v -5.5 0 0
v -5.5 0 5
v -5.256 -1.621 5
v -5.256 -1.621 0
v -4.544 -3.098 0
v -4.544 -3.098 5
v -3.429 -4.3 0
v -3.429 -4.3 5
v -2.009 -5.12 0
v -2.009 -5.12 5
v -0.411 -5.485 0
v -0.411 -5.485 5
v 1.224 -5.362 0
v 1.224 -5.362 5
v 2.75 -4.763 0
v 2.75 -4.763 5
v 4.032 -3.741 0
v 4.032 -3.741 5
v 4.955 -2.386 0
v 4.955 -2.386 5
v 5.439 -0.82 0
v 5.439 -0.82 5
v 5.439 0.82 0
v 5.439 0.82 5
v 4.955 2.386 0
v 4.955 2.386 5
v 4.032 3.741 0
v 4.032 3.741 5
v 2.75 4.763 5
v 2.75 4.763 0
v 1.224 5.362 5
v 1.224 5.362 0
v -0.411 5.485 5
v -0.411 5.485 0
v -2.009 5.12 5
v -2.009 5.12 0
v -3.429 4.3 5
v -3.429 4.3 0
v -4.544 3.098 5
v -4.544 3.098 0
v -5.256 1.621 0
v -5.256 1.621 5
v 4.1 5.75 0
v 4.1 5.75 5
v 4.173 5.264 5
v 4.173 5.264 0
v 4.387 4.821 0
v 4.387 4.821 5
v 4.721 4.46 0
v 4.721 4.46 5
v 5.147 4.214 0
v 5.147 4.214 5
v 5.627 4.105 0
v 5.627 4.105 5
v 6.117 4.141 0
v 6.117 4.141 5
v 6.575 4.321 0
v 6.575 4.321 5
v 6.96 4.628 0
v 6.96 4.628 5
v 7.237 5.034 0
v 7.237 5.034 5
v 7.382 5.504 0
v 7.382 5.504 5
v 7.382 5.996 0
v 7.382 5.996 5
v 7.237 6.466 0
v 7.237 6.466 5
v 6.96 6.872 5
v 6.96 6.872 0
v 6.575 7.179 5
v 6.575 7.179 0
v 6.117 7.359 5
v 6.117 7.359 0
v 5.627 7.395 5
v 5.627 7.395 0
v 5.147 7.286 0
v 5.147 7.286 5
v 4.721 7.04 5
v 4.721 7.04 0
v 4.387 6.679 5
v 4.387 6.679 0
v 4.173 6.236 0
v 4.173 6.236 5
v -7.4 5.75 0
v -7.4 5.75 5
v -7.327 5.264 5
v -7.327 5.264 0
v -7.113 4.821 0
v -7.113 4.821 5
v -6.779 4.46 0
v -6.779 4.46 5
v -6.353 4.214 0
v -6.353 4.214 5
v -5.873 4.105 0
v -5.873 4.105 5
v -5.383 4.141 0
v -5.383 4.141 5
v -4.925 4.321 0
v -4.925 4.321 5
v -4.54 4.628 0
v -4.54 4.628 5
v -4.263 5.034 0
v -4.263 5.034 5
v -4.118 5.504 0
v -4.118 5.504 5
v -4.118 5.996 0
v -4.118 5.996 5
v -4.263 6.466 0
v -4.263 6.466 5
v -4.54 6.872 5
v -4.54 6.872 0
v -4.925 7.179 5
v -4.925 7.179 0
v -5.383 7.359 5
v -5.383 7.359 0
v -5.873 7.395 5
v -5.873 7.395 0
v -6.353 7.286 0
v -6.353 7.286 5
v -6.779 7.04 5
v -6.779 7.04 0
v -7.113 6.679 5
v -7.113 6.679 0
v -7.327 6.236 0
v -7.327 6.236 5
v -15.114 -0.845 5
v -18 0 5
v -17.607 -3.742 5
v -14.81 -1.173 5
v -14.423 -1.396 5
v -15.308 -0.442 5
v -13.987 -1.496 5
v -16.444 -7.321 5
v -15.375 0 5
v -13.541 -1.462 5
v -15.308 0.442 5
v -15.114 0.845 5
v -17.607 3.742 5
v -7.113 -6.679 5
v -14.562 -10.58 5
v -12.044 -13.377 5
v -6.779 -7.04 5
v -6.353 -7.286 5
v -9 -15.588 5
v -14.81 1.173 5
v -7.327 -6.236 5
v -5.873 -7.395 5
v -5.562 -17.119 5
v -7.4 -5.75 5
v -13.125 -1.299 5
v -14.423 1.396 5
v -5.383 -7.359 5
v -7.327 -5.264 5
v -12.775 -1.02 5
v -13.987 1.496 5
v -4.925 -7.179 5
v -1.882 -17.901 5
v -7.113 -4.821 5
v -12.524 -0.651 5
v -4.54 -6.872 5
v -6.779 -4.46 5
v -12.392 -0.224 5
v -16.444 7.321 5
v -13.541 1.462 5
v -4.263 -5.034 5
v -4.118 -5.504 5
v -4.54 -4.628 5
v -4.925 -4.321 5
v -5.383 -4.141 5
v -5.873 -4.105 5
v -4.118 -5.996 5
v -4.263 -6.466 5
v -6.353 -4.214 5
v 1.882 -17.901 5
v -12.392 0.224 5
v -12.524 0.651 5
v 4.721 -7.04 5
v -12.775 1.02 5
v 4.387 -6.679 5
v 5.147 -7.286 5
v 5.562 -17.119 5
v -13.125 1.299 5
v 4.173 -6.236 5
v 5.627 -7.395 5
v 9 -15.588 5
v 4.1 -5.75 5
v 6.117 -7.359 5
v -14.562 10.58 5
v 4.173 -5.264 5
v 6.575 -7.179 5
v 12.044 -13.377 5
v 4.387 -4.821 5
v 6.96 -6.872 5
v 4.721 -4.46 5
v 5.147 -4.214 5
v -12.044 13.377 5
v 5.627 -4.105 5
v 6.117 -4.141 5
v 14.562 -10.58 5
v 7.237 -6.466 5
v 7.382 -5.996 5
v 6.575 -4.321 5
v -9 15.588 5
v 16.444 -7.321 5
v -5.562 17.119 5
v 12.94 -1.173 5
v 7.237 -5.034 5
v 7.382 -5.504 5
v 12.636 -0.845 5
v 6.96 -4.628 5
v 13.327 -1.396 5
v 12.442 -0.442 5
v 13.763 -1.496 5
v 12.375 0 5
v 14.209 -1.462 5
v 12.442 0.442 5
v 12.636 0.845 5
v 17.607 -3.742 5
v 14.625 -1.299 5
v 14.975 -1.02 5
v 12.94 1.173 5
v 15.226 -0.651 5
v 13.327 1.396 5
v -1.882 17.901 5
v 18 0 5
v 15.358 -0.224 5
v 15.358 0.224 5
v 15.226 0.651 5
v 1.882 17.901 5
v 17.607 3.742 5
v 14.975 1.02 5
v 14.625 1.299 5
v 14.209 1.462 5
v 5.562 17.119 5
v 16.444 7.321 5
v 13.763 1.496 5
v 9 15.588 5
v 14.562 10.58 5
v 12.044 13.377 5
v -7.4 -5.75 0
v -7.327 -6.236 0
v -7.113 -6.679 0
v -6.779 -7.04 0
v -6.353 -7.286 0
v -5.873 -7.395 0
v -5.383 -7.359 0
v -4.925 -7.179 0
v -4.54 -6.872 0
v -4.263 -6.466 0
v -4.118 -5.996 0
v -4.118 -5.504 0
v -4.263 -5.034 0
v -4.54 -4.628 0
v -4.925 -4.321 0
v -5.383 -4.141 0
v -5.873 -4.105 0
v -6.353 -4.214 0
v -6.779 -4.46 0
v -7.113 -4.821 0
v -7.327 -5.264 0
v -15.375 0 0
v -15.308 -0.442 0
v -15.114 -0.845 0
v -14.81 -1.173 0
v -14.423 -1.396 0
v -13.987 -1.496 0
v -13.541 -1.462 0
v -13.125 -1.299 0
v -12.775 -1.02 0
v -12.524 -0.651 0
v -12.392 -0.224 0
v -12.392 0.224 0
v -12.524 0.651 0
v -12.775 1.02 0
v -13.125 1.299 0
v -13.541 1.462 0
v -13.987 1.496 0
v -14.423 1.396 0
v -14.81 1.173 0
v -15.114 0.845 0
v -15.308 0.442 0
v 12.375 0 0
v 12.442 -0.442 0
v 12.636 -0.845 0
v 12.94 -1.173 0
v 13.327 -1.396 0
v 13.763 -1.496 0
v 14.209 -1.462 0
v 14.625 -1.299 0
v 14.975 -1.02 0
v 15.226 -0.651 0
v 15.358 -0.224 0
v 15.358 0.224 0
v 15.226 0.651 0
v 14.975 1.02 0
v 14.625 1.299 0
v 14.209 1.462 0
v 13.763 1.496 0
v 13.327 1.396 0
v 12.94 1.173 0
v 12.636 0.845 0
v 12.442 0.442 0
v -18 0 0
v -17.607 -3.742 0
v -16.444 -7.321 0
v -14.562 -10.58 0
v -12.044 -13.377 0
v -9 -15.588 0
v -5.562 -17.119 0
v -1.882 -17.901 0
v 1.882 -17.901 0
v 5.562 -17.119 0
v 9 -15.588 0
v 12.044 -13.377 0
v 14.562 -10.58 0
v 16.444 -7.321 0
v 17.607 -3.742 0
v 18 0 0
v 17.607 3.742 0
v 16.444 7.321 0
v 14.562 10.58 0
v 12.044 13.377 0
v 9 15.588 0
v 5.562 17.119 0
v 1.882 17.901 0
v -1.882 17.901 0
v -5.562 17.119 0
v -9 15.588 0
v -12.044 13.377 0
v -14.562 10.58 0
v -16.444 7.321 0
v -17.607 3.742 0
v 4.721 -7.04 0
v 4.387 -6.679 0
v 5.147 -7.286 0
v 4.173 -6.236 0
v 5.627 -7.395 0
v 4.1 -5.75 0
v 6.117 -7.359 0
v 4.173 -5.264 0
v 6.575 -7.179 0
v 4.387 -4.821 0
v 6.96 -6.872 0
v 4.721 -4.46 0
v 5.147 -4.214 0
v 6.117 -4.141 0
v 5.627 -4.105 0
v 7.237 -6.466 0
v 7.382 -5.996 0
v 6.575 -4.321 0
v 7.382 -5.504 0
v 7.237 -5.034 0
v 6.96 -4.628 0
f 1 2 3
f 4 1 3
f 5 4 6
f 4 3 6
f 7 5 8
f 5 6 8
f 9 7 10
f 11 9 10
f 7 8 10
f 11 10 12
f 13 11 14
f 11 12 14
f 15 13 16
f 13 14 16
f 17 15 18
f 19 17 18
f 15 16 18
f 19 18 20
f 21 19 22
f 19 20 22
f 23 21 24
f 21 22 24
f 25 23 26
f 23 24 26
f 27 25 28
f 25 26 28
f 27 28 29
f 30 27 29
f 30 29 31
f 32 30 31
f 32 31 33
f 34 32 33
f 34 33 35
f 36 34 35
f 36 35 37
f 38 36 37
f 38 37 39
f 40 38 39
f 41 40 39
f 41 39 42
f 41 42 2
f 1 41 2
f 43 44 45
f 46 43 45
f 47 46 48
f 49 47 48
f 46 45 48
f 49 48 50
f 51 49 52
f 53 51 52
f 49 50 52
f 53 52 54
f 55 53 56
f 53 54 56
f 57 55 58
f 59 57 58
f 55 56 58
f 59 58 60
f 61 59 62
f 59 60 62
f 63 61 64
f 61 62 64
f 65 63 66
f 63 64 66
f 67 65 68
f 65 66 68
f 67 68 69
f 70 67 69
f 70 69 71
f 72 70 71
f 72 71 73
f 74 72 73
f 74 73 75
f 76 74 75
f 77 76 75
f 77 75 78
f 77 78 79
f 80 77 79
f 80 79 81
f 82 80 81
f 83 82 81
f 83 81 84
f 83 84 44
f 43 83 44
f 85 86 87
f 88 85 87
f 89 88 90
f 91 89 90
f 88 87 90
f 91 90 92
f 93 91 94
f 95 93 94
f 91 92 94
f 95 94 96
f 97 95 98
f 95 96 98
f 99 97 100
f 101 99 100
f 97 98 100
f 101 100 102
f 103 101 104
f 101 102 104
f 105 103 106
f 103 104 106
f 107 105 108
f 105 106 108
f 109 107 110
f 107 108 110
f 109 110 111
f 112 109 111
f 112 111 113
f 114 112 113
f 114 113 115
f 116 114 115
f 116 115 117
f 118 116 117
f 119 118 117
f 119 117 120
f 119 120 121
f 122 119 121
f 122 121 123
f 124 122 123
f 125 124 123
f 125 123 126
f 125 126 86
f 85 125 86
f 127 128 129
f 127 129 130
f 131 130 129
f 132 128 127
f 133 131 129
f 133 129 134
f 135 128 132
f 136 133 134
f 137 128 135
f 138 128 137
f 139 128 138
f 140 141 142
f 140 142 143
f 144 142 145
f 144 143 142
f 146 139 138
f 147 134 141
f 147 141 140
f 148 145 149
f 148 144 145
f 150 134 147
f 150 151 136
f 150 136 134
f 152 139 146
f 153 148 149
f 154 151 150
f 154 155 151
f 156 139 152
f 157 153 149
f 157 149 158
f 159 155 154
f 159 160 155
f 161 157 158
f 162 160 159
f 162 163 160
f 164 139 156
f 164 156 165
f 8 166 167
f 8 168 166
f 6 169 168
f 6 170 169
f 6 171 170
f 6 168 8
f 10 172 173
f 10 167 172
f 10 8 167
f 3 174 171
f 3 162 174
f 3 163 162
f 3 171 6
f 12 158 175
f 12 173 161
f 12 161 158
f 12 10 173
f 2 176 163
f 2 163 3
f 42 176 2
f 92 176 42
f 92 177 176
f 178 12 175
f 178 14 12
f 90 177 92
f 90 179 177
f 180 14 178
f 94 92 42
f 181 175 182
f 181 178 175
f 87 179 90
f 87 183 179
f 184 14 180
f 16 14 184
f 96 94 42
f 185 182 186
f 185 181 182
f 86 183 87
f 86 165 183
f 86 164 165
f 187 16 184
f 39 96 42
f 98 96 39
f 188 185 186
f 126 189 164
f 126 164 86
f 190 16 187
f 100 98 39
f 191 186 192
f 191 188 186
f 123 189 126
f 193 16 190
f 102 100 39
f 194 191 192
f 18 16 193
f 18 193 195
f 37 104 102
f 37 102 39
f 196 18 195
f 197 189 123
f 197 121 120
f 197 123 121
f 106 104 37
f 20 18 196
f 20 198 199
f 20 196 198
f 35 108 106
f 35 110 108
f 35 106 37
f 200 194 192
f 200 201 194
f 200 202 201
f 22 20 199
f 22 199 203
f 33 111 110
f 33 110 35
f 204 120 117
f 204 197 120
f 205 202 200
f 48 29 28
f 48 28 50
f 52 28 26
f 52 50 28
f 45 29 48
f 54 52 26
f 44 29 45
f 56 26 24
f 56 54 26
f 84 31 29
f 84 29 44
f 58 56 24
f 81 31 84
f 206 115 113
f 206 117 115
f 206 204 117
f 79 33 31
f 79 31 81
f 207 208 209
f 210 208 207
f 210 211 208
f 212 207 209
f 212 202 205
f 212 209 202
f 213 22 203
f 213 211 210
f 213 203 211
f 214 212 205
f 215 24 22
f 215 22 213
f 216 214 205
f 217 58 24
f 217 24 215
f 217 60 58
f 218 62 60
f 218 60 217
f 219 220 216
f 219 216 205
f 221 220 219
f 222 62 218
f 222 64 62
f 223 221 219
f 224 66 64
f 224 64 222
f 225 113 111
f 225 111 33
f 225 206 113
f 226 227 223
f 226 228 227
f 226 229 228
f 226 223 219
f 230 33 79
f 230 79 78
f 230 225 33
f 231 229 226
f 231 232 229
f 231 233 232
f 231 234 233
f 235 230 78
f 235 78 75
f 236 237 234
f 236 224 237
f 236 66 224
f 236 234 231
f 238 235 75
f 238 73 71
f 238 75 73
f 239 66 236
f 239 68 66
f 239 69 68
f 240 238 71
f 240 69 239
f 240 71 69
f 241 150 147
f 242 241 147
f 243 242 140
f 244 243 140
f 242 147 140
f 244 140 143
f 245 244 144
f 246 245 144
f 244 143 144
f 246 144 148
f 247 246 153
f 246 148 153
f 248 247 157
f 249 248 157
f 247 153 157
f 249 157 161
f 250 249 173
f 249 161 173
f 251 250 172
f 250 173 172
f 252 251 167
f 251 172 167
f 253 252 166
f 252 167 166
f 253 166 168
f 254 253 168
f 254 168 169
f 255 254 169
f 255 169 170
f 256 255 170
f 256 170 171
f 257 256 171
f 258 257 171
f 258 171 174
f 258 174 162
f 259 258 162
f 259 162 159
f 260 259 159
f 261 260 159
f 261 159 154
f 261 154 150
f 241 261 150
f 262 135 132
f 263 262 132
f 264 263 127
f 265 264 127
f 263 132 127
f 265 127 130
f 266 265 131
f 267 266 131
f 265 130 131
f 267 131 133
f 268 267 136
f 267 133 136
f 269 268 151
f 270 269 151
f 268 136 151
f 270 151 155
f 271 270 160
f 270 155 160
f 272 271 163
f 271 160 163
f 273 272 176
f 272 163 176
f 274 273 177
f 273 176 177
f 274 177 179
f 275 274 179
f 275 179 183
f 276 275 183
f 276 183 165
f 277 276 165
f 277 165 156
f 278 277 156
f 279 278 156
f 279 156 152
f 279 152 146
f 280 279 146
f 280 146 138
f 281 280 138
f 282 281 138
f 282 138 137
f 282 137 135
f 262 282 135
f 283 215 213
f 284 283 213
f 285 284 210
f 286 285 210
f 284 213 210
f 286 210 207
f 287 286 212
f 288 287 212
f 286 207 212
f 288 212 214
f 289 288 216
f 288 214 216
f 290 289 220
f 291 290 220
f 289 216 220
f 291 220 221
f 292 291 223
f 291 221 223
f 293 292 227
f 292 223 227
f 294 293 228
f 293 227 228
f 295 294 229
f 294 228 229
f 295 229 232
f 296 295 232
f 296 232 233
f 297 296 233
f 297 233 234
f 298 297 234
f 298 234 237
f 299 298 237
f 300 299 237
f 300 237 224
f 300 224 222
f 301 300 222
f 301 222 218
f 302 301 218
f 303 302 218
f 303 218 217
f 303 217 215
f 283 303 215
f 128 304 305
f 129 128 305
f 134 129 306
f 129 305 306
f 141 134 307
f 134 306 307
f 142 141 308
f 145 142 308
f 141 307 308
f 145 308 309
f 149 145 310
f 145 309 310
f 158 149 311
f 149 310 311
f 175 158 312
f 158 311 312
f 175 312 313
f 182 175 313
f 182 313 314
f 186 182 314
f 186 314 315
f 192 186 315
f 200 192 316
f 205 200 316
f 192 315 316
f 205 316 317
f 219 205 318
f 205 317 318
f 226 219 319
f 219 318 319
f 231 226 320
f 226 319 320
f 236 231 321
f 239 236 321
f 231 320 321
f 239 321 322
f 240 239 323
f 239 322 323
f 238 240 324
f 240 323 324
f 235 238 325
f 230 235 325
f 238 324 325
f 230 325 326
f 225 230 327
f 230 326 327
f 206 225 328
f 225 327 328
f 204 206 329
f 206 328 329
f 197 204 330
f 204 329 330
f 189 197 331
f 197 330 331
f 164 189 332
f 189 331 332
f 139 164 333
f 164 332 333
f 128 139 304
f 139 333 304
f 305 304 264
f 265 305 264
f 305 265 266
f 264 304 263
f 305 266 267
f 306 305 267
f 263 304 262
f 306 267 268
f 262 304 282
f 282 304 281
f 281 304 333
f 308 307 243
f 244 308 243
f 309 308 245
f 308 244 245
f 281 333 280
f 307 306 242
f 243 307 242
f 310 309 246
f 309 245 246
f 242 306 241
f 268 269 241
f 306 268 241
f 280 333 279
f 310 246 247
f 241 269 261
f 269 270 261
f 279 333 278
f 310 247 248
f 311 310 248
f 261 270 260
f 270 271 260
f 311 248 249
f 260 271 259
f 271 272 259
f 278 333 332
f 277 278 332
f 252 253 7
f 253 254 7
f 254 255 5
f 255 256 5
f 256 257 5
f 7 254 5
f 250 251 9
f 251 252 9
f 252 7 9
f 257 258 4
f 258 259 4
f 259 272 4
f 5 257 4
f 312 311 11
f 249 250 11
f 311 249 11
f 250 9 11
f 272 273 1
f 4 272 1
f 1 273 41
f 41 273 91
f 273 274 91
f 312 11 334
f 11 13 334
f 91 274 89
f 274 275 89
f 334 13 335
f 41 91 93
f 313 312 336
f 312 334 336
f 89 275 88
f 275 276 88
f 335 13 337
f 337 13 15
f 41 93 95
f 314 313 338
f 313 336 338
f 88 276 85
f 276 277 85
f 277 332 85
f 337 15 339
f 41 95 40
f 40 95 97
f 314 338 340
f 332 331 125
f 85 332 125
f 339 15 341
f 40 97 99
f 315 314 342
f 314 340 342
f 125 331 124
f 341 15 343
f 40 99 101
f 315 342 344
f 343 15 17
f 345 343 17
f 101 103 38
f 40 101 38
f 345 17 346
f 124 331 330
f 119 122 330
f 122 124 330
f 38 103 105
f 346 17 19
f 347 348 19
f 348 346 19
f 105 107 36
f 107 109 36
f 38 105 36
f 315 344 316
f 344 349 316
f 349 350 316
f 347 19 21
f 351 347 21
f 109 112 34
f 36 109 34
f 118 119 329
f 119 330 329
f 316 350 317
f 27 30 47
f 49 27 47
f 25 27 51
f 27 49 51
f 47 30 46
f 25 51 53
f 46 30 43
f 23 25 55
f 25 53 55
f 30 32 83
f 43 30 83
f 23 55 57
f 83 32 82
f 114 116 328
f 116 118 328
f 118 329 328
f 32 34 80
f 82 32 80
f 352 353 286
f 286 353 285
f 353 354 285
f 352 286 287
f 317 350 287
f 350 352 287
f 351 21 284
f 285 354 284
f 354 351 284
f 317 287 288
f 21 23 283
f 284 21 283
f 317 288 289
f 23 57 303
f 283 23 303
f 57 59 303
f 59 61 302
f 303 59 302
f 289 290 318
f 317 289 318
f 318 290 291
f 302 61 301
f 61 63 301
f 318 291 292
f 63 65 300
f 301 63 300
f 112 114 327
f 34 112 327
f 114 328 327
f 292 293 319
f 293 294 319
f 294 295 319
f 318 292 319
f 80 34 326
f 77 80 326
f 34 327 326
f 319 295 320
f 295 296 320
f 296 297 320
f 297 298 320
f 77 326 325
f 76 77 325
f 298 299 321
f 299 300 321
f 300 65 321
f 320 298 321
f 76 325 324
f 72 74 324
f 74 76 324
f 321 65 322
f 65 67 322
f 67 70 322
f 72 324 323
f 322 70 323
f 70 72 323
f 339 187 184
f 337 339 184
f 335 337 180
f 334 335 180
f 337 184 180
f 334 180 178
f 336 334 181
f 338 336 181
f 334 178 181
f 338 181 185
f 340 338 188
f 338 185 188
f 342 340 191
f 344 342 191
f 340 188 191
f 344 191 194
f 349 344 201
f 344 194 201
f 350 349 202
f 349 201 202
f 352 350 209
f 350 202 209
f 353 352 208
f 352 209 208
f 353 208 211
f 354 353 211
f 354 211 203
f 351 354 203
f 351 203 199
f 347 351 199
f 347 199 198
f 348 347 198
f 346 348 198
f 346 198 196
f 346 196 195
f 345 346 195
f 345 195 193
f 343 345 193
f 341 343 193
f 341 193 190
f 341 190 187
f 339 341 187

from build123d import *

# Parameters (mm, degrees)
F1_DEPTH = 5
F2_D     = 3
F2_DEPTH = 6
F2_TIP   = 0.9012909285
F3_D     = 3.3
F3_DEPTH = 6
F3_TIP   = 0.9914200214
F4_D     = 11
F4_DEPTH = 11
F4_TIP   = 3.3047334047


with BuildPart() as f1:
    # F0 (on Top) → F1 (new body)
    with BuildSketch(Plane.XY):
        with BuildLine():
            Line((9.75, 0), (18, 0))
            ThreePointArc((18, 0), (0, 18), (-18, 0))
            Line((-18, 0), (-9.75, 0))
            ThreePointArc((-9.75, 0), (0, 9.75), (9.75, 0))
        make_face()
        with BuildLine():
            ThreePointArc((-18, 0), (0, -18), (18, 0))
            Line((18, 0), (9.75, 0))
            ThreePointArc((9.75, 0), (0, -9.75), (-9.75, 0))
            Line((-9.75, 0), (-18, 0))
        make_face()
        with BuildLine():
            ThreePointArc((-9.75, 0), (0, -9.75), (9.75, 0))
            ThreePointArc((9.75, 0), (0, 9.75), (-9.75, 0))
        make_face()
    extrude(amount=F1_DEPTH)

    # F2
    with Locations(Plane(origin=(0, 0, 0), x_dir=(1, 0, 0), z_dir=(0, 0, -1))):
        with Locations((13.875, 0), (-13.875, 0)):
            Hole(F2_D / 2, depth=F2_DEPTH)
            with Locations((0, 0, -(F2_DEPTH + F2_TIP / 2))):  # 118° drill point
                Cone(0, F2_D / 2, F2_TIP, mode=Mode.SUBTRACT)

    # F3
    with Locations(Plane(origin=(0, 0, 0), x_dir=(1, 0, 0), z_dir=(0, 0, -1))):
        with Locations((5.75, -5.75), (5.75, 5.75), (-5.75, 5.75), (-5.75, -5.75)):
            Hole(F3_D / 2, depth=F3_DEPTH)
            with Locations((0, 0, -(F3_DEPTH + F3_TIP / 2))):  # 118° drill point
                Cone(0, F3_D / 2, F3_TIP, mode=Mode.SUBTRACT)

    # F4
    with Locations(Plane(origin=(0, 0, 0), x_dir=(1, 0, 0), z_dir=(0, 0, -1))):
        with Locations((0, 0)):
            Hole(F4_D / 2, depth=F4_DEPTH)
            with Locations((0, 0, -(F4_DEPTH + F4_TIP / 2))):  # 118° drill point
                Cone(0, F4_D / 2, F4_TIP, mode=Mode.SUBTRACT)


solid = f1.part
